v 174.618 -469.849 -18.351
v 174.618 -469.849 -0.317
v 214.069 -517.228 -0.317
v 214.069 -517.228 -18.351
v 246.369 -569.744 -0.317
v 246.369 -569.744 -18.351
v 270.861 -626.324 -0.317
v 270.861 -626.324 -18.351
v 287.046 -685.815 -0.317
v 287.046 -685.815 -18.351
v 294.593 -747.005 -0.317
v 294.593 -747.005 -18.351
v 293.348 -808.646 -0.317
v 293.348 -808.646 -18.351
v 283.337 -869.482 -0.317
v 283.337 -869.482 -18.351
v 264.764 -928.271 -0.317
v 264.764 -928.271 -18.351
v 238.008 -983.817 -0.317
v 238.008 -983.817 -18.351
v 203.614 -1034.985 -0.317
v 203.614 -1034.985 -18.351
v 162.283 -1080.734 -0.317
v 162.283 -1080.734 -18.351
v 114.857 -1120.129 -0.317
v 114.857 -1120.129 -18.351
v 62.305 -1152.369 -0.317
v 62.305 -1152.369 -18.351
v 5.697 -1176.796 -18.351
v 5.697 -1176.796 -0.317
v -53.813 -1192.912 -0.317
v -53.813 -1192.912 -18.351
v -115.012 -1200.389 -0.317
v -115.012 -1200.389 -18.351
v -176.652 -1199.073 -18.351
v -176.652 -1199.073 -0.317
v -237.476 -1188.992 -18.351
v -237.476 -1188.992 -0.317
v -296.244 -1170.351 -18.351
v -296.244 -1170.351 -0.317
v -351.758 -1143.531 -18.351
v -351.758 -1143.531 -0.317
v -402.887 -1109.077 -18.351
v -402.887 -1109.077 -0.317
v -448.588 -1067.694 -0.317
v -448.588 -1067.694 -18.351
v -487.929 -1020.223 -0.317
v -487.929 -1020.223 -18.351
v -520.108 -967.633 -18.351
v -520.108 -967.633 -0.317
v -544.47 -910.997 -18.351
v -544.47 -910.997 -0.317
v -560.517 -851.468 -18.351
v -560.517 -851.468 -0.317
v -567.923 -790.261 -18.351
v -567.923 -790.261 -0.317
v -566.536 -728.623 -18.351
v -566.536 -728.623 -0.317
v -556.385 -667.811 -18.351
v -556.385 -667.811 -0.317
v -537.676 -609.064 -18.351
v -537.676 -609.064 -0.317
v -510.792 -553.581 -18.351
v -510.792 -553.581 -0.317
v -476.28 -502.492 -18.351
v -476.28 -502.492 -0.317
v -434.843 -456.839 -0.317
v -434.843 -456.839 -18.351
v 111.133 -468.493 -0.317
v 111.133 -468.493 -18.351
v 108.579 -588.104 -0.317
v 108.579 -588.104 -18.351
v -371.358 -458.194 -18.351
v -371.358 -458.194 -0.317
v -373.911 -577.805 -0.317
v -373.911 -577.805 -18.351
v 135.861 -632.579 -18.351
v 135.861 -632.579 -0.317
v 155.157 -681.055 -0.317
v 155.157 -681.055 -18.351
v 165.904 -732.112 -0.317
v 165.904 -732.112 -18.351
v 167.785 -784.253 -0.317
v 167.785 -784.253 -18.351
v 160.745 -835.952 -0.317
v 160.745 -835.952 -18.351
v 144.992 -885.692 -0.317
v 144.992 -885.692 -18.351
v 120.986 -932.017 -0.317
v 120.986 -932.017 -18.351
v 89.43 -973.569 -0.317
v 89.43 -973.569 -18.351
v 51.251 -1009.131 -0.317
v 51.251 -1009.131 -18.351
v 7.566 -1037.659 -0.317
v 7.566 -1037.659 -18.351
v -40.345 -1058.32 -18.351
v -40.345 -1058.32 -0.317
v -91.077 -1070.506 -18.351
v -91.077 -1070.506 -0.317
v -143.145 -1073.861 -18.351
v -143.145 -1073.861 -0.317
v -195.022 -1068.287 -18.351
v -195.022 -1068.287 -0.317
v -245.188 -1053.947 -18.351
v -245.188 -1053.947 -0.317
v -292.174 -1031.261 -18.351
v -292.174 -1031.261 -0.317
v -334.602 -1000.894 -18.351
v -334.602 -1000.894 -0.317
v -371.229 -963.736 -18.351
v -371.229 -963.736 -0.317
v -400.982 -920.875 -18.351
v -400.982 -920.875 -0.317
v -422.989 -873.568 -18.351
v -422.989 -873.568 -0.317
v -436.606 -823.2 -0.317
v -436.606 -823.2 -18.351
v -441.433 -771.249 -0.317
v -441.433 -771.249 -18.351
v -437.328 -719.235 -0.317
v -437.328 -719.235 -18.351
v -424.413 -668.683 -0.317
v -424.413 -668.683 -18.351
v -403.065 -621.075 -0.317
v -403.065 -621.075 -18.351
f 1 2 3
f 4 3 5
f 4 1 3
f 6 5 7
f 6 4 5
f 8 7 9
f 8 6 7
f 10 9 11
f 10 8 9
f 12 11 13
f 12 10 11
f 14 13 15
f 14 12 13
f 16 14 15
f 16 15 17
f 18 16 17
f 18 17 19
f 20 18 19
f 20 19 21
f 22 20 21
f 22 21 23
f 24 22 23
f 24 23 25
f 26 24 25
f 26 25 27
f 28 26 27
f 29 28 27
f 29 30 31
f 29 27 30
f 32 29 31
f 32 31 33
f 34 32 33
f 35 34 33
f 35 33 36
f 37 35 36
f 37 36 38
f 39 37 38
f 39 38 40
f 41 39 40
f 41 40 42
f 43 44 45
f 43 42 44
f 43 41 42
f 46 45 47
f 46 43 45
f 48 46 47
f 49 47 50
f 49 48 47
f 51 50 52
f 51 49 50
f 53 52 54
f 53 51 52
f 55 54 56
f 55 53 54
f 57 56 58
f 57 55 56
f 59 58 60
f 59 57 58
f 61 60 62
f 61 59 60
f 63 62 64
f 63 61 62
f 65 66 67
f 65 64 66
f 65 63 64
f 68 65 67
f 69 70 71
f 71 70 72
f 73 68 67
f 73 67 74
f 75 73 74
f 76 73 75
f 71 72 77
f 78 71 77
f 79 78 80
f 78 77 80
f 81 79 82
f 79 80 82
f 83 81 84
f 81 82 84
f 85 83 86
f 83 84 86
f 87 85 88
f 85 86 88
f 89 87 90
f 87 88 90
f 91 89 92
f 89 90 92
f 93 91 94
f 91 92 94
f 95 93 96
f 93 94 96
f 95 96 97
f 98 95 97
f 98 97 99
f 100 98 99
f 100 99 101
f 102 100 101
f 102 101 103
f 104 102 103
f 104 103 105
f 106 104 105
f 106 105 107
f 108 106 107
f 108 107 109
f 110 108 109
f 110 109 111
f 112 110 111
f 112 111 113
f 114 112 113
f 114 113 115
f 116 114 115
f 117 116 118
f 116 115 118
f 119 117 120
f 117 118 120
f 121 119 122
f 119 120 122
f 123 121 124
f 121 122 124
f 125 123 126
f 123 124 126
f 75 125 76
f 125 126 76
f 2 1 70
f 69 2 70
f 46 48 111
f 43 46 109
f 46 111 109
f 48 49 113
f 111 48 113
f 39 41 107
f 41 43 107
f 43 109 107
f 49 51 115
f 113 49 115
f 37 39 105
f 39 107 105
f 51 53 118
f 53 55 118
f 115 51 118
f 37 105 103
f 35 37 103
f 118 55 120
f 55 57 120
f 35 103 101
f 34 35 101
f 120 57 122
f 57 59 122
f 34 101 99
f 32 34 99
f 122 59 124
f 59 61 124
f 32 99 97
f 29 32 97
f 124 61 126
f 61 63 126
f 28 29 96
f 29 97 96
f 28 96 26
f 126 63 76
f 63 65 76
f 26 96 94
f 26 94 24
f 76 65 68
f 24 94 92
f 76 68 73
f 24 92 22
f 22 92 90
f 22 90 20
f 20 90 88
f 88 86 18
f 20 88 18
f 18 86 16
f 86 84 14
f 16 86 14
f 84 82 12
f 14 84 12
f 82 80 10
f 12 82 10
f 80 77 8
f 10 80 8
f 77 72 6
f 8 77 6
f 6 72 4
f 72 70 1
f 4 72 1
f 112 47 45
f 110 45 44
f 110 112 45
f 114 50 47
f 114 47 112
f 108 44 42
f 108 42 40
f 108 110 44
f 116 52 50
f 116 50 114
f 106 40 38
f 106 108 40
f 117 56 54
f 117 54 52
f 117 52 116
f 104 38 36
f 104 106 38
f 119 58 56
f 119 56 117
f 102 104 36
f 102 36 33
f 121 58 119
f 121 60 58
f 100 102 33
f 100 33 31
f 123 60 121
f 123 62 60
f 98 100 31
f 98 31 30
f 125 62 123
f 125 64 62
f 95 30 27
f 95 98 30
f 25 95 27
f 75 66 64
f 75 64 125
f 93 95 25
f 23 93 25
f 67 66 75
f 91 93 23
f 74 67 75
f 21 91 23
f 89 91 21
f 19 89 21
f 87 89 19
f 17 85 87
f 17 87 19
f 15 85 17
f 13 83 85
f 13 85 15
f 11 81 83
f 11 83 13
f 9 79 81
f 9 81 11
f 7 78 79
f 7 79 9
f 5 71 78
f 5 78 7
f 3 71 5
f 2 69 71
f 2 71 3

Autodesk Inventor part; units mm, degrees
ref_plane "YZ Plane" through (0, 0, 0) normal (1, 0, 0) x (0, 1, 0)
ref_plane "XZ Plane" through (0, 0, 0) normal (0, 1, 0) x (-1, 0, 0)
ref_plane "XY Plane" through (0, 0, 0) normal (0, 0, 1) x (1, 0, 0)
ref_plane "Work Plane1" through (22.5184, 2.463, -18.3509) normal (0, 0, 1) x (0.9997722, -0.0213418, 0)
sketch "ThermoBulbBorder" plane through (22.5184, 2.463, -18.3509) normal (0, 0, 1) x (0.9997722, -0.0213418, 0)
  arc A0 (-447.455, -468.958) -> (162.145, -468.958) centre (-142.655, -774.8145) ccw
  arc A1 (-447.455, -468.958) -> (162.145, -468.958) centre (-142.655, -774.8145) ccw
  arc A2 (-383.955, -588.5959) -> (98.645, -588.5959) centre (-142.655, -774.8145) ccw
  line L0 (-447.455, -468.958) -> (-383.955, -468.958)
  line L1 (-383.955, -468.958) -> (-383.955, -588.5959)
  line L2 (162.145, -468.958) -> (98.645, -468.958)
  line L3 (98.645, -468.958) -> (98.645, -588.5959)
  line L4 (-383.955, -961.033) -> (-484.4967, -1038.6241)
  line L5 (98.645, -961.033) -> (199.1867, -1038.6241)
  arc A3 (-447.455, -468.958) -> (162.145, -468.958) centre (-142.655, -774.8145) ccw projected
  circle A4 centre (-142.655, -774.8145) radius 419.1 construction
  circle A5 centre (-142.655, -774.8145) radius 410.972 construction
  circle A6 centre (-142.655, -774.8145) radius 353.822 construction
  circle A7 centre (-142.655, -774.8145) radius 345.694 construction
  line L6 (98.645, -468.958) -> (98.645, -316.558) construction
  line L7 (-383.955, -468.958) -> (-383.955, -316.558) construction
  dimension "d0" = 609.6
  dimension "d5" = 63.5
  dimension "d6" = 63.5
  dimension "d7" = 838.2
  dimension "d8" = 8.128
  dimension "d9" = 8.128
  dimension "d10" = 57.15
  dimension "d11" = 40.894
  dimension "d12" = 152.4
extrude "Sides" add sketch "ThermoBulbBorder" along normal blind 18.034 contours L0 L1 A2 L4 A0 | L5 A2 L3 L2 A0
extrude "Extrusion2" add sketch "ThermoBulbBorder" along normal blind 18.034 contours L4 A2 L5 A0
equation "\"d6\" = d5"
equation "\"d8\" = sRopeChannel"
equation "\"d9\" = sRopeChannel"
equation "\"sRopeChannel\" = 8.128"
properties part number "HOT Thermo bulb outline"
